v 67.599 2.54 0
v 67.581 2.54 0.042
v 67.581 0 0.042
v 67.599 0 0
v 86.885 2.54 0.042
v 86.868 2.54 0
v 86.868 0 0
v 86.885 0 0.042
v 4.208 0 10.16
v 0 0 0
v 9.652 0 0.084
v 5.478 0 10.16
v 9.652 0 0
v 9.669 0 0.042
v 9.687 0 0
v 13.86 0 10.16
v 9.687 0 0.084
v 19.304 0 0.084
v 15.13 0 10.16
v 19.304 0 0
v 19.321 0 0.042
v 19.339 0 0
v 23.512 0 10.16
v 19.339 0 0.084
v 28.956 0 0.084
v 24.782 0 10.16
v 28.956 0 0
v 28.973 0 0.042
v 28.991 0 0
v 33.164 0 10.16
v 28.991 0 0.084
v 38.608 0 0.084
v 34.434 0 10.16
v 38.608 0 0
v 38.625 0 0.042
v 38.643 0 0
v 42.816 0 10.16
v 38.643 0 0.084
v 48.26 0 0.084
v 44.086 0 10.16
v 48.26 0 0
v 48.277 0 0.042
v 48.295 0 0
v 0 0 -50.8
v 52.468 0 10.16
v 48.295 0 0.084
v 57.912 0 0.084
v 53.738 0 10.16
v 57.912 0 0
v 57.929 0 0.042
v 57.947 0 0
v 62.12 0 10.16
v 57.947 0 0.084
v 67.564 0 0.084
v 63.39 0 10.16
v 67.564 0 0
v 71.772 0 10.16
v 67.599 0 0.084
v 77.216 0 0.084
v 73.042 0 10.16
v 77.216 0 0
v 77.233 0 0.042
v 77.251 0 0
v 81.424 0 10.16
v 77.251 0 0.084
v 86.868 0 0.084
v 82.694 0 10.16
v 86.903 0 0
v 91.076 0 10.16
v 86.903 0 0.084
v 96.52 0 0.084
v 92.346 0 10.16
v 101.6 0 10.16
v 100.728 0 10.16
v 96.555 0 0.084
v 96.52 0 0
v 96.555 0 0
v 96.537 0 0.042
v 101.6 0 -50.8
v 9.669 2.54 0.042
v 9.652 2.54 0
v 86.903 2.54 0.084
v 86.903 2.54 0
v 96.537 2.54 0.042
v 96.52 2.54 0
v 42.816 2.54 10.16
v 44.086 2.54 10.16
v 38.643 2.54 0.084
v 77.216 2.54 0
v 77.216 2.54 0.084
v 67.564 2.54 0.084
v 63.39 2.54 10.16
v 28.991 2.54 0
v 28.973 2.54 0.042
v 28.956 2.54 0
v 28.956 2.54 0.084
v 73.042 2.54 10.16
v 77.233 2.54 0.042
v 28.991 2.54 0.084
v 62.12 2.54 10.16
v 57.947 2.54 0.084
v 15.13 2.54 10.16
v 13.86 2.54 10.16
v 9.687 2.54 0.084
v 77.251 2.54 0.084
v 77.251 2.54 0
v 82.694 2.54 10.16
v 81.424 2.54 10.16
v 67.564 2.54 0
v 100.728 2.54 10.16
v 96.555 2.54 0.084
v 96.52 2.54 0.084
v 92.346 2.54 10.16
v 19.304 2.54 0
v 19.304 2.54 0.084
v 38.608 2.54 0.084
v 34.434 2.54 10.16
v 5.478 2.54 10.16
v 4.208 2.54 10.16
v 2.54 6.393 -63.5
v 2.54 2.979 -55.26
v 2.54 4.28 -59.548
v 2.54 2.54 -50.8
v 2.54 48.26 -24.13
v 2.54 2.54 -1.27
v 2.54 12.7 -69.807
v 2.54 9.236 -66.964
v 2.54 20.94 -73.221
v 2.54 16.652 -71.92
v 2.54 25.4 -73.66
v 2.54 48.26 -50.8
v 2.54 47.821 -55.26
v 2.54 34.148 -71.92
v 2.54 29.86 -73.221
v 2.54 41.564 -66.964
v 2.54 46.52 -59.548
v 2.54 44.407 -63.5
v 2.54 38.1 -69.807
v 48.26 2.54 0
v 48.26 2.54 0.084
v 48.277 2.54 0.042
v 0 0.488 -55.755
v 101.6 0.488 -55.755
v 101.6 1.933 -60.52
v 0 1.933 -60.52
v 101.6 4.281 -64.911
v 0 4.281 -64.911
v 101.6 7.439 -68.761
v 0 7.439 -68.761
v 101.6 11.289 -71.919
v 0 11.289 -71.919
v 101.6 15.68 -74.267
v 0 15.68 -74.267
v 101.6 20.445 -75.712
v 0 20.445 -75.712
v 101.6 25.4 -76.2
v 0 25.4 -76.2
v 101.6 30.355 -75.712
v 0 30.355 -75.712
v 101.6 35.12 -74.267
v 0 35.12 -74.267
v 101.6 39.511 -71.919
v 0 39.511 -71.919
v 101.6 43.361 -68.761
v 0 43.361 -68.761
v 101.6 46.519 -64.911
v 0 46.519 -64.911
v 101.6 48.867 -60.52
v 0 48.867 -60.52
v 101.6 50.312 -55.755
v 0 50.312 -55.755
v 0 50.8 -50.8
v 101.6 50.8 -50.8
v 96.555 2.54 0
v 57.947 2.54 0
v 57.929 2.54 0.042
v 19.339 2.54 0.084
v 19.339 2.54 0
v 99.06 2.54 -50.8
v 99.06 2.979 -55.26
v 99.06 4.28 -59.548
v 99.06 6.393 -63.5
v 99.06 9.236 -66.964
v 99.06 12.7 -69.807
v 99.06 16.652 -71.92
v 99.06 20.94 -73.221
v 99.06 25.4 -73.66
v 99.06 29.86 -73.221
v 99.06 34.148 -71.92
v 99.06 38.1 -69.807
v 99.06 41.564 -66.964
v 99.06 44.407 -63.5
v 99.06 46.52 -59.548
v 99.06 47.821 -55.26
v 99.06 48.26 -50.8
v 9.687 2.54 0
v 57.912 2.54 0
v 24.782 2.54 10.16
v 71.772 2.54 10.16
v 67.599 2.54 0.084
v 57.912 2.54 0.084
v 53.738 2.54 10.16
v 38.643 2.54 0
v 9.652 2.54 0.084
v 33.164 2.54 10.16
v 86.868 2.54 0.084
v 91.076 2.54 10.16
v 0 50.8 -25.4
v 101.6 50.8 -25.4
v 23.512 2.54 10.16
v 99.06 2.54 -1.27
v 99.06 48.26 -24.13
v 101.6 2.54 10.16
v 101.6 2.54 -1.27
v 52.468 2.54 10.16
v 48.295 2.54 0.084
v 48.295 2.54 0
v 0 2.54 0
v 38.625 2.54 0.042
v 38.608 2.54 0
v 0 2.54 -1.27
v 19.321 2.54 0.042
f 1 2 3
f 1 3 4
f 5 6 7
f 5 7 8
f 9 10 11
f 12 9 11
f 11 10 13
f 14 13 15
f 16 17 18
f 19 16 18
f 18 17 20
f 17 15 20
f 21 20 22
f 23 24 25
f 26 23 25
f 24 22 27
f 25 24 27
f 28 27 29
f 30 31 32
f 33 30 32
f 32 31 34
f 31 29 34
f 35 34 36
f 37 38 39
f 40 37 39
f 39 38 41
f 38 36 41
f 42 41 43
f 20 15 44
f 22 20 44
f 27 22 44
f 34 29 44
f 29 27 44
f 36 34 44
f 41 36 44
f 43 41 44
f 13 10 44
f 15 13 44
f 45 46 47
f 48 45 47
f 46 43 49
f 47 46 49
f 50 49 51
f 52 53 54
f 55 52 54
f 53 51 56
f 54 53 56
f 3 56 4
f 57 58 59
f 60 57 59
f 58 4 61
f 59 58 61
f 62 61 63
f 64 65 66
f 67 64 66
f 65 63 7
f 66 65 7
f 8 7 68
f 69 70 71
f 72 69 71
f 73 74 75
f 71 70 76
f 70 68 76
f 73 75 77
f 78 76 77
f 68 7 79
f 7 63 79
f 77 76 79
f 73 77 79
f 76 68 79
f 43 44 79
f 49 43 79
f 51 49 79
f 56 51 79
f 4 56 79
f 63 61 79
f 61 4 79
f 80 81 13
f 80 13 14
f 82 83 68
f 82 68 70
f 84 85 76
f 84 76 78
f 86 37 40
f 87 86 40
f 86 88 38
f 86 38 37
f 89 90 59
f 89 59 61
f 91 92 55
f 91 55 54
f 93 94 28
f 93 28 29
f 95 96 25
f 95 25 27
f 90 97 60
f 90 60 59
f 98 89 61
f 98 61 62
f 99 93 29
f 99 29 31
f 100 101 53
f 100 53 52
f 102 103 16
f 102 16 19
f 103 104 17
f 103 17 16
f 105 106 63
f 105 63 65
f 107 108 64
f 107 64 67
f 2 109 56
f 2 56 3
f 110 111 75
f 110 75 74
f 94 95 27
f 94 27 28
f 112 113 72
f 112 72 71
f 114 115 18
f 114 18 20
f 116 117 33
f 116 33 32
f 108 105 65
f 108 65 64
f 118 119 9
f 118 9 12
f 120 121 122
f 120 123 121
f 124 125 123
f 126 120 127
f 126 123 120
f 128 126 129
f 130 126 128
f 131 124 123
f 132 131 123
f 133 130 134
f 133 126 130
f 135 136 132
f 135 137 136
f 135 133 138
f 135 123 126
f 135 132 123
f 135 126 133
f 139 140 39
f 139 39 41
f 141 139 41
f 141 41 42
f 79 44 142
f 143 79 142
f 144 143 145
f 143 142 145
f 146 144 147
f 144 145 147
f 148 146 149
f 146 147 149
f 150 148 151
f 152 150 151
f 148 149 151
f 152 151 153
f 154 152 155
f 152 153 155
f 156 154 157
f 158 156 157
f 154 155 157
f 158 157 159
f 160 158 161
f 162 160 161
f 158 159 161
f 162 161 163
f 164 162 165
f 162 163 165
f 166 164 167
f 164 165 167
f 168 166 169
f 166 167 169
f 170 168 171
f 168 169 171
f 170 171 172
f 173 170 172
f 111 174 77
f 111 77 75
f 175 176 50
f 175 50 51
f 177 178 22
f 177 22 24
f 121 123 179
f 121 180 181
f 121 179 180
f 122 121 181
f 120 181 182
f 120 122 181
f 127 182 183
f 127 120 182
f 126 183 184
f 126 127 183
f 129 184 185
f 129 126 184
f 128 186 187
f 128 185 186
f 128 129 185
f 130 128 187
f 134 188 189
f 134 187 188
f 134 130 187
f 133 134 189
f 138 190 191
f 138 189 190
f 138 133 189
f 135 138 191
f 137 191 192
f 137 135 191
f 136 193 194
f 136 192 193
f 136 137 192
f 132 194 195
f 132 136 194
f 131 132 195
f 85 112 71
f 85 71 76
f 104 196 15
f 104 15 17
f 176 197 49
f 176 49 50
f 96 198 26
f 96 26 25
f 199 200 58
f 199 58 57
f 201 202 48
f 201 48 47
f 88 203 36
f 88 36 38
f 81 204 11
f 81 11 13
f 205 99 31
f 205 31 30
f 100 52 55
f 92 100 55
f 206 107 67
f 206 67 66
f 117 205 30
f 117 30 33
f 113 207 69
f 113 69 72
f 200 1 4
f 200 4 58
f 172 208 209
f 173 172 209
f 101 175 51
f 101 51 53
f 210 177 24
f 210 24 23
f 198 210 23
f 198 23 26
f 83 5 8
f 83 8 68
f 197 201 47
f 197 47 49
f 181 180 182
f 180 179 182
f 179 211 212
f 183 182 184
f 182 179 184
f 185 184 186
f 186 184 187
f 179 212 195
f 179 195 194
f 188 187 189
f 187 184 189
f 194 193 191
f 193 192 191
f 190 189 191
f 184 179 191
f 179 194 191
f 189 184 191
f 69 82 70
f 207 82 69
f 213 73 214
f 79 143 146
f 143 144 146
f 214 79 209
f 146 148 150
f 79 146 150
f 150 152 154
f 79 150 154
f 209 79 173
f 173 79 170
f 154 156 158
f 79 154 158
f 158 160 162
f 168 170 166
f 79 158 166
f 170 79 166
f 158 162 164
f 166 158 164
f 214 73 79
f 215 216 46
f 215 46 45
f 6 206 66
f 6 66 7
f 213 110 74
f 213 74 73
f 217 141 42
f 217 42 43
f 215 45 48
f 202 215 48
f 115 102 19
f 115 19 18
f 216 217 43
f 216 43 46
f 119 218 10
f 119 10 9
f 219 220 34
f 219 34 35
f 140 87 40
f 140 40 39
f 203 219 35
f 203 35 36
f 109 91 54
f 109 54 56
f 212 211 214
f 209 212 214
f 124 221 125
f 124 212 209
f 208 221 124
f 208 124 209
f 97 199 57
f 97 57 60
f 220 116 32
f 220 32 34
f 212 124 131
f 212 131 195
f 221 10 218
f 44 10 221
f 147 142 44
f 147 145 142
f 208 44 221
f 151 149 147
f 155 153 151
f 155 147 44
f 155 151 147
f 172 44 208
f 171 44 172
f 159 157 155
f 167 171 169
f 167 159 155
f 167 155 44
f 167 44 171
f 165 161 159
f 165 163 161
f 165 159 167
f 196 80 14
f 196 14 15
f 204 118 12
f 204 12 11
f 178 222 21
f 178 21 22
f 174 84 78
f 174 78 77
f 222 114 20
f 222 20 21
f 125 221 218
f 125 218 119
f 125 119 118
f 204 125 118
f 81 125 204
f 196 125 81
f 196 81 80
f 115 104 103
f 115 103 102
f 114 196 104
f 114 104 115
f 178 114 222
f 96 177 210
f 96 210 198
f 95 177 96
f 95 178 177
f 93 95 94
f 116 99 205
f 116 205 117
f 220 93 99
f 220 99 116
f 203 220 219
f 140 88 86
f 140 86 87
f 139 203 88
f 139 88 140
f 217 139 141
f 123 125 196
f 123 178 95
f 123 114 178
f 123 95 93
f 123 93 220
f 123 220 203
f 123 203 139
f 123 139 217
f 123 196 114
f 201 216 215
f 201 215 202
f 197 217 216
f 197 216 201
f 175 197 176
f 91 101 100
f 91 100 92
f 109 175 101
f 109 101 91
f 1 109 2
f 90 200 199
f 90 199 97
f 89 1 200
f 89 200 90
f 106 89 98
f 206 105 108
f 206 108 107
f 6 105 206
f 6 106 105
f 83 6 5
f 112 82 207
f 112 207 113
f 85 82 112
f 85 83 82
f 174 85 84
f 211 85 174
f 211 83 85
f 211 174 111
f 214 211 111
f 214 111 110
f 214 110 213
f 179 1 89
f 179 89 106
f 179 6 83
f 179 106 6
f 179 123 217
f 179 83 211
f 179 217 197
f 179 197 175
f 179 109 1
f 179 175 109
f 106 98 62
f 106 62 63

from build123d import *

# Parameters (mm, degrees)
SKETCH1_W           = 101.6
SKETCH1_H           = 50.8
BOSS_EXTRUDE1_DEPTH = 50.8
BOSS_EXTRUDE2_DEPTH = 101.6
CUT_EXTRUDE1_DEPTH  = 101.6
SHELL1_T            = -2.54
SKETCH4_W           = 101.6
SKETCH4_H           = 2.54
BOSS_EXTRUDE3_DEPTH = 12.7
CUT_EXTRUDE2_DEPTH  = 2.54
LPATTERN1_COUNT     = 11
LPATTERN1_PITCH     = 9.652


with BuildPart() as part:
    # Sketch1 → Boss-Extrude1 (new body)
    with BuildSketch(Plane.XY):
        with Locations((50.8, 25.4)):
            Rectangle(SKETCH1_W, SKETCH1_H)
    extrude(amount=-BOSS_EXTRUDE1_DEPTH)

    # Sketch2 → Boss-Extrude2 (add)
    with BuildSketch(Plane.ZY):
        with BuildLine():
            Line((-50.8, 50.8), (-50.8, 0))
            ThreePointArc((-50.8, 0), (-76.2, 25.4), (-50.8, 50.8))
        make_face()
    extrude(amount=-BOSS_EXTRUDE2_DEPTH)

    # Sketch3 → Cut-Extrude1 (cut)
    with BuildSketch(Plane.ZY):
        Polygon((0, 0), (-25.4, 50.8), (0, 50.8), align=None)
    extrude(amount=-CUT_EXTRUDE1_DEPTH, mode=Mode.SUBTRACT)

    # Shell1
    shell1_openings = [part.faces().sort_by_distance(p)[0] for p in [
        (50.8, 25.4, -12.7),
    ]]
    offset(amount=SHELL1_T, openings=shell1_openings, kind=Kind.INTERSECTION)

    # Sketch4 → Boss-Extrude3 (add)
    with BuildSketch(Plane.XY.offset(-2.54)):
        with Locations((50.8, 1.27)):
            Rectangle(SKETCH4_W, SKETCH4_H)
    extrude(amount=BOSS_EXTRUDE3_DEPTH)

    # Sketch5 → Cut-Extrude2 (cut)
    with BuildSketch(Plane(origin=(0, 2.54, 0), x_dir=(1, 0, 0), z_dir=(0, 1, 0))):
        Polygon((0, 0), (4.208409794, -10.16), (0, -10.16), align=None)
        Polygon((5.478409794, -10.16), (9.686819587, 0), (9.686819587, -10.16), align=None)
    cut_extrude2 = extrude(amount=-CUT_EXTRUDE2_DEPTH, mode=Mode.SUBTRACT)

    # LPattern1: Cut-Extrude2 ×11
    with Locations(*[(i * LPATTERN1_PITCH, 0, 0) for i in range(1, LPATTERN1_COUNT)]):
        add(cut_extrude2, mode=Mode.SUBTRACT)


solid = part.part
